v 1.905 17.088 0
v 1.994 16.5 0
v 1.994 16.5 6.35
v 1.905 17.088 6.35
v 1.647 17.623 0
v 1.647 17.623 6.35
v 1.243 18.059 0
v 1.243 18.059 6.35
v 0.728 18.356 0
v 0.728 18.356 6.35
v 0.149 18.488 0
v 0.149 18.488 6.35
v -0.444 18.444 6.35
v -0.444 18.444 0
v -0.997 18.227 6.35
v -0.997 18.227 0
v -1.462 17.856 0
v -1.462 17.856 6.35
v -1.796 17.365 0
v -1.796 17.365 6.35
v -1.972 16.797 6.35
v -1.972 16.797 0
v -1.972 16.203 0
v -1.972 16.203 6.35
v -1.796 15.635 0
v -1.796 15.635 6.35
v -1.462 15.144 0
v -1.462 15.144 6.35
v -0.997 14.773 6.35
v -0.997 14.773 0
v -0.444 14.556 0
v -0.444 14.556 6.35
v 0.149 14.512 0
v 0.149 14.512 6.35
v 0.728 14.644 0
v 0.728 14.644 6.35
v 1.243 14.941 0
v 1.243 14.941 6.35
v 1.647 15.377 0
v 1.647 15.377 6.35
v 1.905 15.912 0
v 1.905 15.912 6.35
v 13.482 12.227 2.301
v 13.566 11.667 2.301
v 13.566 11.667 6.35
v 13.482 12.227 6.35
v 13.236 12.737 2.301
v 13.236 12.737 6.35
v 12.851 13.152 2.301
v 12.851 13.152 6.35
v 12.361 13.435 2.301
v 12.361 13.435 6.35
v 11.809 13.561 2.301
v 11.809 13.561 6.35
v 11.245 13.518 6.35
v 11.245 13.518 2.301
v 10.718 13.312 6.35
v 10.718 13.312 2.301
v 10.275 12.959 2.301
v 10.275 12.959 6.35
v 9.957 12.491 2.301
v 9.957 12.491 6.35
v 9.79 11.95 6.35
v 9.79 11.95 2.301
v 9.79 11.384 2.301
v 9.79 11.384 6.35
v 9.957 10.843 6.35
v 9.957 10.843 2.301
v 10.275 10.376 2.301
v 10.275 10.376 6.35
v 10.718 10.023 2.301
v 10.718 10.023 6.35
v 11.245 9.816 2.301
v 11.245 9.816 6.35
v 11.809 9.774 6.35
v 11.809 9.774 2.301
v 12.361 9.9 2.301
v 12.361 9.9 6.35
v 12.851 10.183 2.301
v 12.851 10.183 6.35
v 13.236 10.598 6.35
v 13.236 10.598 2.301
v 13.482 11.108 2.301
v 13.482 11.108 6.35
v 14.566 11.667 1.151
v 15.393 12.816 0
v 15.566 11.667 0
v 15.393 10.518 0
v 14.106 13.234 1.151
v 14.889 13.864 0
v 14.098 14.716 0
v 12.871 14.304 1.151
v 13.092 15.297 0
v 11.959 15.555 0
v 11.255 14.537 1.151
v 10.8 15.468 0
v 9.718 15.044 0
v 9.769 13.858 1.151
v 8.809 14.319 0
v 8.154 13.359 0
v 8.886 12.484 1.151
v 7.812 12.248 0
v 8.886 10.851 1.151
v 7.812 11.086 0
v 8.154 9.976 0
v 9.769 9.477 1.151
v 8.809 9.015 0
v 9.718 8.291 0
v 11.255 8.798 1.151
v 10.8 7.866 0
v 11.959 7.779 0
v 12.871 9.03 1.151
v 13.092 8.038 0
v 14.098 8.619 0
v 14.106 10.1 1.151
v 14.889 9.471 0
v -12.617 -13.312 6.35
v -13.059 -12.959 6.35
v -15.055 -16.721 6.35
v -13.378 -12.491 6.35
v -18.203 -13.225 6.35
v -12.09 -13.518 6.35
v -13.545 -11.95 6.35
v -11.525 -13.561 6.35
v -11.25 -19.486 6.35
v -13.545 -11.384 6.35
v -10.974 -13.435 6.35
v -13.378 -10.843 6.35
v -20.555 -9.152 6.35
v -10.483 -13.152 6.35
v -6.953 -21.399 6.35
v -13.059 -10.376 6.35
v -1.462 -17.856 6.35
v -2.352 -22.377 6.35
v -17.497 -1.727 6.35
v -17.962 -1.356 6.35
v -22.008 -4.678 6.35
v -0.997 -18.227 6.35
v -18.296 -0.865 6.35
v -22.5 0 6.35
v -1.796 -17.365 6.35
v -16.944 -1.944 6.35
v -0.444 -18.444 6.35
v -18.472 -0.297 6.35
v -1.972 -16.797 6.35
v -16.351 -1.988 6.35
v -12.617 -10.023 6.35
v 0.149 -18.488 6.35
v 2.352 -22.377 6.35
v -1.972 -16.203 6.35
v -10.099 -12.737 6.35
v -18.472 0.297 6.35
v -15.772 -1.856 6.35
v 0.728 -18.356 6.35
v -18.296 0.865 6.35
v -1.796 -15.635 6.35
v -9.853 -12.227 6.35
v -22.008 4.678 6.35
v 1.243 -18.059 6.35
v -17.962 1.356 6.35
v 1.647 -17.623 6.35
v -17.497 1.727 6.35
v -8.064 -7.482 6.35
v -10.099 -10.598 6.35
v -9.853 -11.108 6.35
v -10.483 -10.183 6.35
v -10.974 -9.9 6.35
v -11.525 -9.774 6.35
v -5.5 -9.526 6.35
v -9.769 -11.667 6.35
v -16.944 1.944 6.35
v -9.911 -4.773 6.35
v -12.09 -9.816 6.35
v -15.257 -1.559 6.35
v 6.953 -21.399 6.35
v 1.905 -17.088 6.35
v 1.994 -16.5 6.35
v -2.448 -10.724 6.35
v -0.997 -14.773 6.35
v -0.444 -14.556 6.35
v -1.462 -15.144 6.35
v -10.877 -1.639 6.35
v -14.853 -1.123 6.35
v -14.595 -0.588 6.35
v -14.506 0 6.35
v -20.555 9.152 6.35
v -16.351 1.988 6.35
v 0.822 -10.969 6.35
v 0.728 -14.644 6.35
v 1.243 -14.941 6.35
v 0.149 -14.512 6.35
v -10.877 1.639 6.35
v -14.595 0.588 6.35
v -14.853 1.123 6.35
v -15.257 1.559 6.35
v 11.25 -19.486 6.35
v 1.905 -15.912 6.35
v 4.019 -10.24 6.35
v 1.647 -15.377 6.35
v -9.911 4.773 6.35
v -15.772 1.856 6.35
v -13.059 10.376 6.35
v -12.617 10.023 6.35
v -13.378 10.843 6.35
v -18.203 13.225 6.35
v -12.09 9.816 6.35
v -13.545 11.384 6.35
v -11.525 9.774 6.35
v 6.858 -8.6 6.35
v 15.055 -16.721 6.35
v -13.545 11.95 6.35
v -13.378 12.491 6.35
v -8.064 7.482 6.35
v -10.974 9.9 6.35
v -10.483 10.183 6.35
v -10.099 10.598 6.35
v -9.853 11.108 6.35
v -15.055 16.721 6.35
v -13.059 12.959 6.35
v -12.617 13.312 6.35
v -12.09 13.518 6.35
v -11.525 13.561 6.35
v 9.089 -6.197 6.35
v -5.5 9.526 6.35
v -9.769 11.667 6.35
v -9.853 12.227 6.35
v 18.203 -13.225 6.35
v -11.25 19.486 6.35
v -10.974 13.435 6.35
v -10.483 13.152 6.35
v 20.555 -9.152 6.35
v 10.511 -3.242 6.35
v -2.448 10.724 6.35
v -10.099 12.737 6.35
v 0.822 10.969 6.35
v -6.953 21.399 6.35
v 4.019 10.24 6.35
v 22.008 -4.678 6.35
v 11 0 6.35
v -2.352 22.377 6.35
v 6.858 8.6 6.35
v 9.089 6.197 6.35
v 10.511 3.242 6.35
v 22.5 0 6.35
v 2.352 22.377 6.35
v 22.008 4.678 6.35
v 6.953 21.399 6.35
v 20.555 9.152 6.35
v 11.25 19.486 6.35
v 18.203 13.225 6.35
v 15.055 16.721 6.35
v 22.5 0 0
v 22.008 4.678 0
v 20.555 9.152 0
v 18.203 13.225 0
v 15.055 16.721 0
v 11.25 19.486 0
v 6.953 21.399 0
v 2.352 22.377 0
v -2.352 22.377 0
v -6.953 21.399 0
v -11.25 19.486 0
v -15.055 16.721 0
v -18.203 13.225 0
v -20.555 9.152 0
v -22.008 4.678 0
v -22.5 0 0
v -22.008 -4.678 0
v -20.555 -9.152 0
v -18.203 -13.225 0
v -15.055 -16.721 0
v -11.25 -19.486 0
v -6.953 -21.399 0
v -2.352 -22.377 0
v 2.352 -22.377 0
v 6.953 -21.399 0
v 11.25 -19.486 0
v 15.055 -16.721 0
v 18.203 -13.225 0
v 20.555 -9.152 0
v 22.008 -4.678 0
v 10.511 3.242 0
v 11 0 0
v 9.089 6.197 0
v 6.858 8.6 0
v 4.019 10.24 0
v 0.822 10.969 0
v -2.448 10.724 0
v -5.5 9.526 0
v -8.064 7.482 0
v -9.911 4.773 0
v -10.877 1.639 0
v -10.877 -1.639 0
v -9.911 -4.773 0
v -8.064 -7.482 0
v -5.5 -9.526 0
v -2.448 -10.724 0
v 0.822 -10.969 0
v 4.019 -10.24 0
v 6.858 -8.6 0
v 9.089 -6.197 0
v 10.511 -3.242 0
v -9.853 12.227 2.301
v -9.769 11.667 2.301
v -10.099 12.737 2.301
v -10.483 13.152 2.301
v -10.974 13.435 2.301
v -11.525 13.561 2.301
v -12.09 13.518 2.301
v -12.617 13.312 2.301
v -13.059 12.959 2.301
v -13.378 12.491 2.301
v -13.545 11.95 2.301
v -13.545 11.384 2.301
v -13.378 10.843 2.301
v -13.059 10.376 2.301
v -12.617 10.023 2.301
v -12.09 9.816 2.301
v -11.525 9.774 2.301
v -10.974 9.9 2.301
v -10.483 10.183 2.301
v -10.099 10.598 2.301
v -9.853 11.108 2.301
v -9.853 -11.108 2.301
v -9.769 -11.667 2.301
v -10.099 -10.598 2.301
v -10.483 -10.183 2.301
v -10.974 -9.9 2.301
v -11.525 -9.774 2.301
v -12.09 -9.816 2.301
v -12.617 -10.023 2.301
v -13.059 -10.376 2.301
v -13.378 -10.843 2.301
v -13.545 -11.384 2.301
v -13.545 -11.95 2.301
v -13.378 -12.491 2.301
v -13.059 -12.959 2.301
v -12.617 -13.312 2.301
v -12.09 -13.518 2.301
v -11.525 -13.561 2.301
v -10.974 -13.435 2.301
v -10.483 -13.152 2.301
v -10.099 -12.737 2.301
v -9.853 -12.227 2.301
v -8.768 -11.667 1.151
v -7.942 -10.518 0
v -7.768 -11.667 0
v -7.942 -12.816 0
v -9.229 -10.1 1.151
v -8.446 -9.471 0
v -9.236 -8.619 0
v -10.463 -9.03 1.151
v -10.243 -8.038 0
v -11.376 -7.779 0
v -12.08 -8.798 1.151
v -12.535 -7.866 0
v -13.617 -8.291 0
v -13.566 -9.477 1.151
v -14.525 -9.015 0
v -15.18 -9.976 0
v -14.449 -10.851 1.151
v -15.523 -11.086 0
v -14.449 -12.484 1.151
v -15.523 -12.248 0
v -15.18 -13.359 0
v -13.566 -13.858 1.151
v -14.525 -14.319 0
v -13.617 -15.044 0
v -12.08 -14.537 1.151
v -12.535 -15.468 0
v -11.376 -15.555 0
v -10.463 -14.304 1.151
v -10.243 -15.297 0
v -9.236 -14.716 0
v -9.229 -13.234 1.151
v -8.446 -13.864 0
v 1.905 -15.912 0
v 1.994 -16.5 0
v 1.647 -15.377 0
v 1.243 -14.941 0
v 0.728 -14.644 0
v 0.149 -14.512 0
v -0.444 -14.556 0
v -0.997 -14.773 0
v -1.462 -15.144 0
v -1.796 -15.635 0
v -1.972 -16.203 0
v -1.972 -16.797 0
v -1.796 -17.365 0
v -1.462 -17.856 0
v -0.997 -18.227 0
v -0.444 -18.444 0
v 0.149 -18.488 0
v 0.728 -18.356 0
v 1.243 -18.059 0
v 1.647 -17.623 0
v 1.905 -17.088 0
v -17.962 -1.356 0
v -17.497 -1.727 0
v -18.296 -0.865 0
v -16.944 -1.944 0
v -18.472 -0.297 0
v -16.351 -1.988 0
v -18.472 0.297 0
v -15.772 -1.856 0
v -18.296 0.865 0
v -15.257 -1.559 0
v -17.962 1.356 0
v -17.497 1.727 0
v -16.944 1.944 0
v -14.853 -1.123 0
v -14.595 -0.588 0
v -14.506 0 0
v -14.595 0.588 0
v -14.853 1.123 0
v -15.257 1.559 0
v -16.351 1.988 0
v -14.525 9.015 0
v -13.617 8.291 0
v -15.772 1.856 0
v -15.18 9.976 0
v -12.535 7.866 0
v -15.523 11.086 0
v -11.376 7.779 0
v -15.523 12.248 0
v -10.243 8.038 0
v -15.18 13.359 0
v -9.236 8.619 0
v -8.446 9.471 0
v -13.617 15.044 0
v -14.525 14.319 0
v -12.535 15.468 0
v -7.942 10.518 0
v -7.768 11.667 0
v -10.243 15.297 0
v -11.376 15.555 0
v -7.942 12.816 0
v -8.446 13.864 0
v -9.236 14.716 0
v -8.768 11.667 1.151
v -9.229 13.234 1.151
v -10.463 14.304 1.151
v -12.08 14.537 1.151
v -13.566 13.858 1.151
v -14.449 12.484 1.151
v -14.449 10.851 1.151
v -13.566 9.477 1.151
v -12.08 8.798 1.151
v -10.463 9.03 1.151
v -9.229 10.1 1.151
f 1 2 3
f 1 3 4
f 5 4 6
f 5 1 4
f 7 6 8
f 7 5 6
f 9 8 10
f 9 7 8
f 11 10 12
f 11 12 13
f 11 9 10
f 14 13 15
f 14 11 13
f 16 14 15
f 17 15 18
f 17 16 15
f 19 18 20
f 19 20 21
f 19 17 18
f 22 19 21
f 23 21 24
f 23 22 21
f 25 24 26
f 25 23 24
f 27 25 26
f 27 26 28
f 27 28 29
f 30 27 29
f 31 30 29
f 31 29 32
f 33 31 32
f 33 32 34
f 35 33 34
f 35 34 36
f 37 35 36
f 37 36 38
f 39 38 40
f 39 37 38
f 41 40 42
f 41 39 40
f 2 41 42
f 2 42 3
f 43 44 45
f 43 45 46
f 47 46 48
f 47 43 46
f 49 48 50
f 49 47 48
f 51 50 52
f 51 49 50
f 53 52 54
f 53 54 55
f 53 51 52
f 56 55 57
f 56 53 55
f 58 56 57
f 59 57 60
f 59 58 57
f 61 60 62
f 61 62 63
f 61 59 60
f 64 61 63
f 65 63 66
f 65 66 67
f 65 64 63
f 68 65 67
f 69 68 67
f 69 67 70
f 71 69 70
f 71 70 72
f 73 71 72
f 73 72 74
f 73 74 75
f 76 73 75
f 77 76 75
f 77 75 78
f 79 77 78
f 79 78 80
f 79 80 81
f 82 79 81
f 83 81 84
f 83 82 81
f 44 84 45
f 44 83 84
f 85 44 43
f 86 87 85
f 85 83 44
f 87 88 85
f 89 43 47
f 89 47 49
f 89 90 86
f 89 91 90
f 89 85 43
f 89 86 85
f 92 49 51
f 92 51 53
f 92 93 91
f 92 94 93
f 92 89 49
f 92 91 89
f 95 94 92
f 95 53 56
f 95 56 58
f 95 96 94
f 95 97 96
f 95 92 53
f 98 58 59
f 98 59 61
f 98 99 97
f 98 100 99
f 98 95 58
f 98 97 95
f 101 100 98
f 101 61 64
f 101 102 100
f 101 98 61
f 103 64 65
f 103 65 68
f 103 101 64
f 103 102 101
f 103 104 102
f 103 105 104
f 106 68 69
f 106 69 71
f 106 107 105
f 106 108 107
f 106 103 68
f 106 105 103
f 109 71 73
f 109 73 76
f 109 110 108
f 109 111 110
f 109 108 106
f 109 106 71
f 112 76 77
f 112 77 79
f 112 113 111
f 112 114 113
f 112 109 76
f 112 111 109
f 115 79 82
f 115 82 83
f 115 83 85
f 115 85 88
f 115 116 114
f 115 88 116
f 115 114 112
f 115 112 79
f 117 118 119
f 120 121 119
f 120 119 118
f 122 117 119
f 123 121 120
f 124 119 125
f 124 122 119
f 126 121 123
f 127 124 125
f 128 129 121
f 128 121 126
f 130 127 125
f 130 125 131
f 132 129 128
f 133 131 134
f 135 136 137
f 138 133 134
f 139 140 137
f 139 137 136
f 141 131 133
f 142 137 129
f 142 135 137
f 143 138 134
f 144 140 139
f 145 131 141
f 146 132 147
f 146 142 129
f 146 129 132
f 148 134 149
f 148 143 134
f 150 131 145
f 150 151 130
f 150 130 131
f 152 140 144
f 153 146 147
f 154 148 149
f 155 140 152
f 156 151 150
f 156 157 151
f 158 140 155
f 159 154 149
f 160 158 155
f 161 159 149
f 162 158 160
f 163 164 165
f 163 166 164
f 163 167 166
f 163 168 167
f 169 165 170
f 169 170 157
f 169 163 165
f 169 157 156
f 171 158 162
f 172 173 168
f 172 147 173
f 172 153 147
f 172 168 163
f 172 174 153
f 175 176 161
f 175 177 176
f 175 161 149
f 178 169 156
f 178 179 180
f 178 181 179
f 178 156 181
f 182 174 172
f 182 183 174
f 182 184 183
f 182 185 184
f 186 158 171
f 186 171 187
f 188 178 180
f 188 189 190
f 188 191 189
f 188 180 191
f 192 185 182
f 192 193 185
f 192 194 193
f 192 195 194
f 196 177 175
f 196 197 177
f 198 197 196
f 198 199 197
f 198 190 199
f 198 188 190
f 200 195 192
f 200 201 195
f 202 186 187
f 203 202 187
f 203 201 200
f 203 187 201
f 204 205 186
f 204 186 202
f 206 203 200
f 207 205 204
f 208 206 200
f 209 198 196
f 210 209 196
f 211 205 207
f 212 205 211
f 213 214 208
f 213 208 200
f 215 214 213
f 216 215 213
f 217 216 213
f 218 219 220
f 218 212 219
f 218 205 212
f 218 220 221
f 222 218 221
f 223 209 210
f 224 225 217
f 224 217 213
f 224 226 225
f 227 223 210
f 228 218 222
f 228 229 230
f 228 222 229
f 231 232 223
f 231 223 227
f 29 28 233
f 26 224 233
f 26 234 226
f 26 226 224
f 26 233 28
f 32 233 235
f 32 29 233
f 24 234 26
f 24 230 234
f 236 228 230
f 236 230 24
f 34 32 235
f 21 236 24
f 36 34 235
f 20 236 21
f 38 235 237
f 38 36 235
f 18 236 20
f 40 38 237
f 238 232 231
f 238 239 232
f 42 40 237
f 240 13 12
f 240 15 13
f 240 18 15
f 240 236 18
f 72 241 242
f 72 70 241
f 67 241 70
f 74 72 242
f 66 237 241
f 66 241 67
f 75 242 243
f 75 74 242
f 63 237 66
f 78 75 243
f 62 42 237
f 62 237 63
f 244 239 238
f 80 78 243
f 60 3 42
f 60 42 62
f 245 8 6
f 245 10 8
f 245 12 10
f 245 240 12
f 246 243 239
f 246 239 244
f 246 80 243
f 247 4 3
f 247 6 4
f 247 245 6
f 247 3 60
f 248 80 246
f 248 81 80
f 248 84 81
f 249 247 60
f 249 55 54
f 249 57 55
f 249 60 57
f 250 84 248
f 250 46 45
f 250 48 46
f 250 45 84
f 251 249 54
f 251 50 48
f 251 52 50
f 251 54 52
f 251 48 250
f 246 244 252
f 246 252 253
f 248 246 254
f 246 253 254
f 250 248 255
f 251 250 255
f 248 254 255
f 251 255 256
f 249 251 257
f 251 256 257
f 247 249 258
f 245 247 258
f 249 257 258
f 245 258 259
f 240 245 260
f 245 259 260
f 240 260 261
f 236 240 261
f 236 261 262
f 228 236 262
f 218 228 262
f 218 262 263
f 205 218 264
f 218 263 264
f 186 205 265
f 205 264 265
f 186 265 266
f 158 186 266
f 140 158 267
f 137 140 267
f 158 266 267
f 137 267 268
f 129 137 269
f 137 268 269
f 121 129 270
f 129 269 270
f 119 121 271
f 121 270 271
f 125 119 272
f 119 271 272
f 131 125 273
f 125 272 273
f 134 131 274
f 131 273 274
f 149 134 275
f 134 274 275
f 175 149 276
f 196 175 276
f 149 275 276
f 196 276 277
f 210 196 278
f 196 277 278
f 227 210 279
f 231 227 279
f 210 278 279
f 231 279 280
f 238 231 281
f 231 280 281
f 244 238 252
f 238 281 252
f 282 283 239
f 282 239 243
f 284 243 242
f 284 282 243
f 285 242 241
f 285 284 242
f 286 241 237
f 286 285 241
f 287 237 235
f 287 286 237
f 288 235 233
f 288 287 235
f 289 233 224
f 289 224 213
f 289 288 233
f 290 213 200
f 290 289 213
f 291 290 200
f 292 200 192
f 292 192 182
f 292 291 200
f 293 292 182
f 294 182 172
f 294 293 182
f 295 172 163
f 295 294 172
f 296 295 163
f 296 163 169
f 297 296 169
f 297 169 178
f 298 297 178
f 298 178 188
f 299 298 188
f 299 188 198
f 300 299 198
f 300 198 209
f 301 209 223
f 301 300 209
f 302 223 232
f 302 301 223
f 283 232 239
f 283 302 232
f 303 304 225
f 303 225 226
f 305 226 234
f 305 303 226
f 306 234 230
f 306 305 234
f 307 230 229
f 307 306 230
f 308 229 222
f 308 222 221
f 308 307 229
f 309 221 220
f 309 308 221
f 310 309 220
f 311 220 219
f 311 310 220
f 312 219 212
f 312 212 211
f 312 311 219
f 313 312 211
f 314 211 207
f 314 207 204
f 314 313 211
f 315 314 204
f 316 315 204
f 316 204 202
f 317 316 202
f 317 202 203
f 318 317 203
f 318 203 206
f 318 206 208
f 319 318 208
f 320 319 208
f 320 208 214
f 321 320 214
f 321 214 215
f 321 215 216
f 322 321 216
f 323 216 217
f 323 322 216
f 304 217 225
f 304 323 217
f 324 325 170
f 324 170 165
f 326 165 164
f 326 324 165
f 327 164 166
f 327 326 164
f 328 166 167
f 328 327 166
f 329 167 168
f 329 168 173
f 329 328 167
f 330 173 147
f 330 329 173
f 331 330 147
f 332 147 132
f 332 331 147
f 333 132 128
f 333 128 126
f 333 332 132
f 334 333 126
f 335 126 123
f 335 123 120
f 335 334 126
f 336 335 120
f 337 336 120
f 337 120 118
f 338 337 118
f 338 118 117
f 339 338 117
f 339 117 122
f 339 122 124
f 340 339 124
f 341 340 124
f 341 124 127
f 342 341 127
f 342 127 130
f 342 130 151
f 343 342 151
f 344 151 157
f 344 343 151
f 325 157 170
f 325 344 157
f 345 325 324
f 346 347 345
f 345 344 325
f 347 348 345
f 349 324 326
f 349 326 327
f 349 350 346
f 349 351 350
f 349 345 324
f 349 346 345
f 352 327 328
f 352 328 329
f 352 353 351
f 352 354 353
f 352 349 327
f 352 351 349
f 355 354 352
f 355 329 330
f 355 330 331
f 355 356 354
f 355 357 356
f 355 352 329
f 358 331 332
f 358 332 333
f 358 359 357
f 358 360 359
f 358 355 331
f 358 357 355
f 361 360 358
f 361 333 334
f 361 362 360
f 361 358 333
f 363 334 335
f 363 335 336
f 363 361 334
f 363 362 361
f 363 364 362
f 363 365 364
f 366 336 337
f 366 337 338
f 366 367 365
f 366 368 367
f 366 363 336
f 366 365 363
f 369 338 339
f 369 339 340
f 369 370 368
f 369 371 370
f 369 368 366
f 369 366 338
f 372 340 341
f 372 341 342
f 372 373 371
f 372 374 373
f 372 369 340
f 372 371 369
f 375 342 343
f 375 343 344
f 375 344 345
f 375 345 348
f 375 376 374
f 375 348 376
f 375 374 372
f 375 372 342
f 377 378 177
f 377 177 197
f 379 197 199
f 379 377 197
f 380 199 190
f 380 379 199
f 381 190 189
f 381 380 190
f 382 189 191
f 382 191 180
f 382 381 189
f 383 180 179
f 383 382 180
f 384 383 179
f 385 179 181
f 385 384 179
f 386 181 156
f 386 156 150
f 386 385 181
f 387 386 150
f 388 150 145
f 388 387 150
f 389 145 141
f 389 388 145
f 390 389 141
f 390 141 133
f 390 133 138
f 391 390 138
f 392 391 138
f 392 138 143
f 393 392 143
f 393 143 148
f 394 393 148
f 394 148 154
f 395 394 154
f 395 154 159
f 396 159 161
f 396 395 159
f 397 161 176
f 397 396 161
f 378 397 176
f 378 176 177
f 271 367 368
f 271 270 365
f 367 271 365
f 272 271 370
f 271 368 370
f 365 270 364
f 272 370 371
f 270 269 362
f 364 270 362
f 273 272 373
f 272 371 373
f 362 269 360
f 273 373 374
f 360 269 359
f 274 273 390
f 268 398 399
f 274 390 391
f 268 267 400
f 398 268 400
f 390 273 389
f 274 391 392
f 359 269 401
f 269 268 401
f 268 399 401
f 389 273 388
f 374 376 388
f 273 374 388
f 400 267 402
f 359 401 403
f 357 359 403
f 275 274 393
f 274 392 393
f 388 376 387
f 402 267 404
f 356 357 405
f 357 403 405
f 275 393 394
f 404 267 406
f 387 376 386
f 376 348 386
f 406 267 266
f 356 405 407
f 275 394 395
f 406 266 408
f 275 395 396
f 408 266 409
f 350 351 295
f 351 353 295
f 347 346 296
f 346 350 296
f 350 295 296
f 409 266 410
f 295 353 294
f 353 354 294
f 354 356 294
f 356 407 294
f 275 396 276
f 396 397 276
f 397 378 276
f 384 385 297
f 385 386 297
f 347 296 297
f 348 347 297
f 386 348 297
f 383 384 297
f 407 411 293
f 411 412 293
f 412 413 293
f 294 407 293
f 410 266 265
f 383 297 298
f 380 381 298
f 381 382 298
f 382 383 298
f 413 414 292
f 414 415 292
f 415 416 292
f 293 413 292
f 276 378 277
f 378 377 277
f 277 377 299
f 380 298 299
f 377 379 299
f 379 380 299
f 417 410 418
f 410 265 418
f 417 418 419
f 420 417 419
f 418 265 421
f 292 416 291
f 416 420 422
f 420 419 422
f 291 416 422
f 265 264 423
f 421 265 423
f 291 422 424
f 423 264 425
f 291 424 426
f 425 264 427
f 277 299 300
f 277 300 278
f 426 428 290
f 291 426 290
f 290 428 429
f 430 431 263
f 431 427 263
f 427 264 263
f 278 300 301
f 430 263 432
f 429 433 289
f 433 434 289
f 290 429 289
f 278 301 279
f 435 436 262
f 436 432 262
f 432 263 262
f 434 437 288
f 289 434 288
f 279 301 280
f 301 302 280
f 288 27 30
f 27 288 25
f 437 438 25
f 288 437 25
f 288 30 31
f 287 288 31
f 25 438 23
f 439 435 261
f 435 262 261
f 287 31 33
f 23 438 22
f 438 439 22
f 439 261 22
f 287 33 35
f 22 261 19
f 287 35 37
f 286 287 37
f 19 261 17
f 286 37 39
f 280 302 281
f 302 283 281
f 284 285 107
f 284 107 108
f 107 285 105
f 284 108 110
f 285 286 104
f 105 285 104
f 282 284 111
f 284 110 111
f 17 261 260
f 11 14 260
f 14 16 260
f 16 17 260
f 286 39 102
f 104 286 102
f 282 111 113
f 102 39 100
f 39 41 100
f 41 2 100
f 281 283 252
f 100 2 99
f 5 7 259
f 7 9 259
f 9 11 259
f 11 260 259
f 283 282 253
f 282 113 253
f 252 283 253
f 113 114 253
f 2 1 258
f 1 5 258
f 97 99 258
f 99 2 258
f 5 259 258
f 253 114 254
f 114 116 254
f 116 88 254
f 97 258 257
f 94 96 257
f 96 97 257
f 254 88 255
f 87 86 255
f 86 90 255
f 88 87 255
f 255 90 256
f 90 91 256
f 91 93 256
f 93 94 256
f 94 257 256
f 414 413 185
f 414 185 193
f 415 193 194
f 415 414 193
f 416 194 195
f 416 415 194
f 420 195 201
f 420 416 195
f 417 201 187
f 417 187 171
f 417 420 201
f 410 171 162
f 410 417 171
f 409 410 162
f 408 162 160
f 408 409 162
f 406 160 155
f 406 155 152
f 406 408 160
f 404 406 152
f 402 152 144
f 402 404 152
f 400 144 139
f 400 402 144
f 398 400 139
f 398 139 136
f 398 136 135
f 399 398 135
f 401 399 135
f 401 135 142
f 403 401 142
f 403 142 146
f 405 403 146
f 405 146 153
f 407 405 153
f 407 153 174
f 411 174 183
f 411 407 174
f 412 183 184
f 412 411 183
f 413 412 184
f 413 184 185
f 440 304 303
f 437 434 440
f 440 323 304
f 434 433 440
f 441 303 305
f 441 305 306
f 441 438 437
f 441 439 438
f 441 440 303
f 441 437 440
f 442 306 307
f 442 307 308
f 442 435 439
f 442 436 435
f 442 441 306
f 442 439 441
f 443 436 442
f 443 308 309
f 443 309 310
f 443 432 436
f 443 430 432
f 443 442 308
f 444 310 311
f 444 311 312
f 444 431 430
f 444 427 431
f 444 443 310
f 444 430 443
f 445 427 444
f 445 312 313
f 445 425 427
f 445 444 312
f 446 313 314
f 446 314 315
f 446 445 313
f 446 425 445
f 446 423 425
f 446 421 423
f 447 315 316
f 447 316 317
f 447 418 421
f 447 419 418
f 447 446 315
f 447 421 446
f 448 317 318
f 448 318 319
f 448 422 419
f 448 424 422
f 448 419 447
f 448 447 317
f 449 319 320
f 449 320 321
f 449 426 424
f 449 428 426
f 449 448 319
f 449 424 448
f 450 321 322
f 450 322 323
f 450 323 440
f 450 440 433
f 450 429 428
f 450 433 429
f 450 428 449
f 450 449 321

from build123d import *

# Parameters (mm, degrees)
SKETCH1_R             = 22.5
SKETCH1_R_2           = 11
SKETCH1_R_3           = 1.9939
SKETCH1_R_4           = 1.89865
BOSS_EXTRUDE1_DEPTH   = 6.35
CHAMFER1_SIZE         = 2.301024407
CHAMFER1_SIZE2        = 2.00025
CHAMFER1_PART_2_SIZE  = 2.301024407
CHAMFER1_PART_2_SIZE2 = 2.00025
CHAMFER1_PART_3_SIZE  = 2.301024407
CHAMFER1_PART_3_SIZE2 = 2.00025


with BuildPart() as part:
    # Sketch1 → Boss-Extrude1 (new body)
    with BuildSketch(Plane.XY):
        Circle(SKETCH1_R)
        Circle(SKETCH1_R_2, mode=Mode.SUBTRACT)
        with Locations((0, 16.5)):
            Circle(SKETCH1_R_3, mode=Mode.SUBTRACT)
        with Locations((11.66726189, 11.66726189)):
            Circle(SKETCH1_R_4, mode=Mode.SUBTRACT)
        with Locations((0, -16.5)):
            Circle(SKETCH1_R_3, mode=Mode.SUBTRACT)
        with Locations((-11.66726189, -11.66726189)):
            Circle(SKETCH1_R_4, mode=Mode.SUBTRACT)
        with Locations((-16.5, 0)):
            Circle(SKETCH1_R_3, mode=Mode.SUBTRACT)
        with Locations((-11.66726189, 11.66726189)):
            Circle(SKETCH1_R_4, mode=Mode.SUBTRACT)
    extrude(amount=BOSS_EXTRUDE1_DEPTH)

    # Chamfer1
    chamfer1_edges = [part.edges().sort_by_distance(p)[0] for p in [
        (9.76861189, 11.66726189, 0),
    ]]
    chamfer1_side = [part.faces().sort_by_distance(p)[0] for p in [
        (9.76861189, 11.66726189, 3.175),
    ]]
    chamfer(chamfer1_edges, length=CHAMFER1_SIZE, length2=CHAMFER1_SIZE2, reference=chamfer1_side[0])

    # Chamfer1 part 2
    chamfer1_part_2_edges = [part.edges().sort_by_distance(p)[0] for p in [
        (-13.56591189, -11.66726189, 0),
    ]]
    chamfer1_part_2_side = [part.faces().sort_by_distance(p)[0] for p in [
        (-13.56591189, -11.66726189, 3.175),
    ]]
    chamfer(chamfer1_part_2_edges, length=CHAMFER1_PART_2_SIZE, length2=CHAMFER1_PART_2_SIZE2, reference=chamfer1_part_2_side[0])

    # Chamfer1 part 3
    chamfer1_part_3_edges = [part.edges().sort_by_distance(p)[0] for p in [
        (-13.56591189, 11.66726189, 0),
    ]]
    chamfer1_part_3_side = [part.faces().sort_by_distance(p)[0] for p in [
        (-13.56591189, 11.66726189, 3.175),
    ]]
    chamfer(chamfer1_part_3_edges, length=CHAMFER1_PART_3_SIZE, length2=CHAMFER1_PART_3_SIZE2, reference=chamfer1_part_3_side[0])


solid = part.part
